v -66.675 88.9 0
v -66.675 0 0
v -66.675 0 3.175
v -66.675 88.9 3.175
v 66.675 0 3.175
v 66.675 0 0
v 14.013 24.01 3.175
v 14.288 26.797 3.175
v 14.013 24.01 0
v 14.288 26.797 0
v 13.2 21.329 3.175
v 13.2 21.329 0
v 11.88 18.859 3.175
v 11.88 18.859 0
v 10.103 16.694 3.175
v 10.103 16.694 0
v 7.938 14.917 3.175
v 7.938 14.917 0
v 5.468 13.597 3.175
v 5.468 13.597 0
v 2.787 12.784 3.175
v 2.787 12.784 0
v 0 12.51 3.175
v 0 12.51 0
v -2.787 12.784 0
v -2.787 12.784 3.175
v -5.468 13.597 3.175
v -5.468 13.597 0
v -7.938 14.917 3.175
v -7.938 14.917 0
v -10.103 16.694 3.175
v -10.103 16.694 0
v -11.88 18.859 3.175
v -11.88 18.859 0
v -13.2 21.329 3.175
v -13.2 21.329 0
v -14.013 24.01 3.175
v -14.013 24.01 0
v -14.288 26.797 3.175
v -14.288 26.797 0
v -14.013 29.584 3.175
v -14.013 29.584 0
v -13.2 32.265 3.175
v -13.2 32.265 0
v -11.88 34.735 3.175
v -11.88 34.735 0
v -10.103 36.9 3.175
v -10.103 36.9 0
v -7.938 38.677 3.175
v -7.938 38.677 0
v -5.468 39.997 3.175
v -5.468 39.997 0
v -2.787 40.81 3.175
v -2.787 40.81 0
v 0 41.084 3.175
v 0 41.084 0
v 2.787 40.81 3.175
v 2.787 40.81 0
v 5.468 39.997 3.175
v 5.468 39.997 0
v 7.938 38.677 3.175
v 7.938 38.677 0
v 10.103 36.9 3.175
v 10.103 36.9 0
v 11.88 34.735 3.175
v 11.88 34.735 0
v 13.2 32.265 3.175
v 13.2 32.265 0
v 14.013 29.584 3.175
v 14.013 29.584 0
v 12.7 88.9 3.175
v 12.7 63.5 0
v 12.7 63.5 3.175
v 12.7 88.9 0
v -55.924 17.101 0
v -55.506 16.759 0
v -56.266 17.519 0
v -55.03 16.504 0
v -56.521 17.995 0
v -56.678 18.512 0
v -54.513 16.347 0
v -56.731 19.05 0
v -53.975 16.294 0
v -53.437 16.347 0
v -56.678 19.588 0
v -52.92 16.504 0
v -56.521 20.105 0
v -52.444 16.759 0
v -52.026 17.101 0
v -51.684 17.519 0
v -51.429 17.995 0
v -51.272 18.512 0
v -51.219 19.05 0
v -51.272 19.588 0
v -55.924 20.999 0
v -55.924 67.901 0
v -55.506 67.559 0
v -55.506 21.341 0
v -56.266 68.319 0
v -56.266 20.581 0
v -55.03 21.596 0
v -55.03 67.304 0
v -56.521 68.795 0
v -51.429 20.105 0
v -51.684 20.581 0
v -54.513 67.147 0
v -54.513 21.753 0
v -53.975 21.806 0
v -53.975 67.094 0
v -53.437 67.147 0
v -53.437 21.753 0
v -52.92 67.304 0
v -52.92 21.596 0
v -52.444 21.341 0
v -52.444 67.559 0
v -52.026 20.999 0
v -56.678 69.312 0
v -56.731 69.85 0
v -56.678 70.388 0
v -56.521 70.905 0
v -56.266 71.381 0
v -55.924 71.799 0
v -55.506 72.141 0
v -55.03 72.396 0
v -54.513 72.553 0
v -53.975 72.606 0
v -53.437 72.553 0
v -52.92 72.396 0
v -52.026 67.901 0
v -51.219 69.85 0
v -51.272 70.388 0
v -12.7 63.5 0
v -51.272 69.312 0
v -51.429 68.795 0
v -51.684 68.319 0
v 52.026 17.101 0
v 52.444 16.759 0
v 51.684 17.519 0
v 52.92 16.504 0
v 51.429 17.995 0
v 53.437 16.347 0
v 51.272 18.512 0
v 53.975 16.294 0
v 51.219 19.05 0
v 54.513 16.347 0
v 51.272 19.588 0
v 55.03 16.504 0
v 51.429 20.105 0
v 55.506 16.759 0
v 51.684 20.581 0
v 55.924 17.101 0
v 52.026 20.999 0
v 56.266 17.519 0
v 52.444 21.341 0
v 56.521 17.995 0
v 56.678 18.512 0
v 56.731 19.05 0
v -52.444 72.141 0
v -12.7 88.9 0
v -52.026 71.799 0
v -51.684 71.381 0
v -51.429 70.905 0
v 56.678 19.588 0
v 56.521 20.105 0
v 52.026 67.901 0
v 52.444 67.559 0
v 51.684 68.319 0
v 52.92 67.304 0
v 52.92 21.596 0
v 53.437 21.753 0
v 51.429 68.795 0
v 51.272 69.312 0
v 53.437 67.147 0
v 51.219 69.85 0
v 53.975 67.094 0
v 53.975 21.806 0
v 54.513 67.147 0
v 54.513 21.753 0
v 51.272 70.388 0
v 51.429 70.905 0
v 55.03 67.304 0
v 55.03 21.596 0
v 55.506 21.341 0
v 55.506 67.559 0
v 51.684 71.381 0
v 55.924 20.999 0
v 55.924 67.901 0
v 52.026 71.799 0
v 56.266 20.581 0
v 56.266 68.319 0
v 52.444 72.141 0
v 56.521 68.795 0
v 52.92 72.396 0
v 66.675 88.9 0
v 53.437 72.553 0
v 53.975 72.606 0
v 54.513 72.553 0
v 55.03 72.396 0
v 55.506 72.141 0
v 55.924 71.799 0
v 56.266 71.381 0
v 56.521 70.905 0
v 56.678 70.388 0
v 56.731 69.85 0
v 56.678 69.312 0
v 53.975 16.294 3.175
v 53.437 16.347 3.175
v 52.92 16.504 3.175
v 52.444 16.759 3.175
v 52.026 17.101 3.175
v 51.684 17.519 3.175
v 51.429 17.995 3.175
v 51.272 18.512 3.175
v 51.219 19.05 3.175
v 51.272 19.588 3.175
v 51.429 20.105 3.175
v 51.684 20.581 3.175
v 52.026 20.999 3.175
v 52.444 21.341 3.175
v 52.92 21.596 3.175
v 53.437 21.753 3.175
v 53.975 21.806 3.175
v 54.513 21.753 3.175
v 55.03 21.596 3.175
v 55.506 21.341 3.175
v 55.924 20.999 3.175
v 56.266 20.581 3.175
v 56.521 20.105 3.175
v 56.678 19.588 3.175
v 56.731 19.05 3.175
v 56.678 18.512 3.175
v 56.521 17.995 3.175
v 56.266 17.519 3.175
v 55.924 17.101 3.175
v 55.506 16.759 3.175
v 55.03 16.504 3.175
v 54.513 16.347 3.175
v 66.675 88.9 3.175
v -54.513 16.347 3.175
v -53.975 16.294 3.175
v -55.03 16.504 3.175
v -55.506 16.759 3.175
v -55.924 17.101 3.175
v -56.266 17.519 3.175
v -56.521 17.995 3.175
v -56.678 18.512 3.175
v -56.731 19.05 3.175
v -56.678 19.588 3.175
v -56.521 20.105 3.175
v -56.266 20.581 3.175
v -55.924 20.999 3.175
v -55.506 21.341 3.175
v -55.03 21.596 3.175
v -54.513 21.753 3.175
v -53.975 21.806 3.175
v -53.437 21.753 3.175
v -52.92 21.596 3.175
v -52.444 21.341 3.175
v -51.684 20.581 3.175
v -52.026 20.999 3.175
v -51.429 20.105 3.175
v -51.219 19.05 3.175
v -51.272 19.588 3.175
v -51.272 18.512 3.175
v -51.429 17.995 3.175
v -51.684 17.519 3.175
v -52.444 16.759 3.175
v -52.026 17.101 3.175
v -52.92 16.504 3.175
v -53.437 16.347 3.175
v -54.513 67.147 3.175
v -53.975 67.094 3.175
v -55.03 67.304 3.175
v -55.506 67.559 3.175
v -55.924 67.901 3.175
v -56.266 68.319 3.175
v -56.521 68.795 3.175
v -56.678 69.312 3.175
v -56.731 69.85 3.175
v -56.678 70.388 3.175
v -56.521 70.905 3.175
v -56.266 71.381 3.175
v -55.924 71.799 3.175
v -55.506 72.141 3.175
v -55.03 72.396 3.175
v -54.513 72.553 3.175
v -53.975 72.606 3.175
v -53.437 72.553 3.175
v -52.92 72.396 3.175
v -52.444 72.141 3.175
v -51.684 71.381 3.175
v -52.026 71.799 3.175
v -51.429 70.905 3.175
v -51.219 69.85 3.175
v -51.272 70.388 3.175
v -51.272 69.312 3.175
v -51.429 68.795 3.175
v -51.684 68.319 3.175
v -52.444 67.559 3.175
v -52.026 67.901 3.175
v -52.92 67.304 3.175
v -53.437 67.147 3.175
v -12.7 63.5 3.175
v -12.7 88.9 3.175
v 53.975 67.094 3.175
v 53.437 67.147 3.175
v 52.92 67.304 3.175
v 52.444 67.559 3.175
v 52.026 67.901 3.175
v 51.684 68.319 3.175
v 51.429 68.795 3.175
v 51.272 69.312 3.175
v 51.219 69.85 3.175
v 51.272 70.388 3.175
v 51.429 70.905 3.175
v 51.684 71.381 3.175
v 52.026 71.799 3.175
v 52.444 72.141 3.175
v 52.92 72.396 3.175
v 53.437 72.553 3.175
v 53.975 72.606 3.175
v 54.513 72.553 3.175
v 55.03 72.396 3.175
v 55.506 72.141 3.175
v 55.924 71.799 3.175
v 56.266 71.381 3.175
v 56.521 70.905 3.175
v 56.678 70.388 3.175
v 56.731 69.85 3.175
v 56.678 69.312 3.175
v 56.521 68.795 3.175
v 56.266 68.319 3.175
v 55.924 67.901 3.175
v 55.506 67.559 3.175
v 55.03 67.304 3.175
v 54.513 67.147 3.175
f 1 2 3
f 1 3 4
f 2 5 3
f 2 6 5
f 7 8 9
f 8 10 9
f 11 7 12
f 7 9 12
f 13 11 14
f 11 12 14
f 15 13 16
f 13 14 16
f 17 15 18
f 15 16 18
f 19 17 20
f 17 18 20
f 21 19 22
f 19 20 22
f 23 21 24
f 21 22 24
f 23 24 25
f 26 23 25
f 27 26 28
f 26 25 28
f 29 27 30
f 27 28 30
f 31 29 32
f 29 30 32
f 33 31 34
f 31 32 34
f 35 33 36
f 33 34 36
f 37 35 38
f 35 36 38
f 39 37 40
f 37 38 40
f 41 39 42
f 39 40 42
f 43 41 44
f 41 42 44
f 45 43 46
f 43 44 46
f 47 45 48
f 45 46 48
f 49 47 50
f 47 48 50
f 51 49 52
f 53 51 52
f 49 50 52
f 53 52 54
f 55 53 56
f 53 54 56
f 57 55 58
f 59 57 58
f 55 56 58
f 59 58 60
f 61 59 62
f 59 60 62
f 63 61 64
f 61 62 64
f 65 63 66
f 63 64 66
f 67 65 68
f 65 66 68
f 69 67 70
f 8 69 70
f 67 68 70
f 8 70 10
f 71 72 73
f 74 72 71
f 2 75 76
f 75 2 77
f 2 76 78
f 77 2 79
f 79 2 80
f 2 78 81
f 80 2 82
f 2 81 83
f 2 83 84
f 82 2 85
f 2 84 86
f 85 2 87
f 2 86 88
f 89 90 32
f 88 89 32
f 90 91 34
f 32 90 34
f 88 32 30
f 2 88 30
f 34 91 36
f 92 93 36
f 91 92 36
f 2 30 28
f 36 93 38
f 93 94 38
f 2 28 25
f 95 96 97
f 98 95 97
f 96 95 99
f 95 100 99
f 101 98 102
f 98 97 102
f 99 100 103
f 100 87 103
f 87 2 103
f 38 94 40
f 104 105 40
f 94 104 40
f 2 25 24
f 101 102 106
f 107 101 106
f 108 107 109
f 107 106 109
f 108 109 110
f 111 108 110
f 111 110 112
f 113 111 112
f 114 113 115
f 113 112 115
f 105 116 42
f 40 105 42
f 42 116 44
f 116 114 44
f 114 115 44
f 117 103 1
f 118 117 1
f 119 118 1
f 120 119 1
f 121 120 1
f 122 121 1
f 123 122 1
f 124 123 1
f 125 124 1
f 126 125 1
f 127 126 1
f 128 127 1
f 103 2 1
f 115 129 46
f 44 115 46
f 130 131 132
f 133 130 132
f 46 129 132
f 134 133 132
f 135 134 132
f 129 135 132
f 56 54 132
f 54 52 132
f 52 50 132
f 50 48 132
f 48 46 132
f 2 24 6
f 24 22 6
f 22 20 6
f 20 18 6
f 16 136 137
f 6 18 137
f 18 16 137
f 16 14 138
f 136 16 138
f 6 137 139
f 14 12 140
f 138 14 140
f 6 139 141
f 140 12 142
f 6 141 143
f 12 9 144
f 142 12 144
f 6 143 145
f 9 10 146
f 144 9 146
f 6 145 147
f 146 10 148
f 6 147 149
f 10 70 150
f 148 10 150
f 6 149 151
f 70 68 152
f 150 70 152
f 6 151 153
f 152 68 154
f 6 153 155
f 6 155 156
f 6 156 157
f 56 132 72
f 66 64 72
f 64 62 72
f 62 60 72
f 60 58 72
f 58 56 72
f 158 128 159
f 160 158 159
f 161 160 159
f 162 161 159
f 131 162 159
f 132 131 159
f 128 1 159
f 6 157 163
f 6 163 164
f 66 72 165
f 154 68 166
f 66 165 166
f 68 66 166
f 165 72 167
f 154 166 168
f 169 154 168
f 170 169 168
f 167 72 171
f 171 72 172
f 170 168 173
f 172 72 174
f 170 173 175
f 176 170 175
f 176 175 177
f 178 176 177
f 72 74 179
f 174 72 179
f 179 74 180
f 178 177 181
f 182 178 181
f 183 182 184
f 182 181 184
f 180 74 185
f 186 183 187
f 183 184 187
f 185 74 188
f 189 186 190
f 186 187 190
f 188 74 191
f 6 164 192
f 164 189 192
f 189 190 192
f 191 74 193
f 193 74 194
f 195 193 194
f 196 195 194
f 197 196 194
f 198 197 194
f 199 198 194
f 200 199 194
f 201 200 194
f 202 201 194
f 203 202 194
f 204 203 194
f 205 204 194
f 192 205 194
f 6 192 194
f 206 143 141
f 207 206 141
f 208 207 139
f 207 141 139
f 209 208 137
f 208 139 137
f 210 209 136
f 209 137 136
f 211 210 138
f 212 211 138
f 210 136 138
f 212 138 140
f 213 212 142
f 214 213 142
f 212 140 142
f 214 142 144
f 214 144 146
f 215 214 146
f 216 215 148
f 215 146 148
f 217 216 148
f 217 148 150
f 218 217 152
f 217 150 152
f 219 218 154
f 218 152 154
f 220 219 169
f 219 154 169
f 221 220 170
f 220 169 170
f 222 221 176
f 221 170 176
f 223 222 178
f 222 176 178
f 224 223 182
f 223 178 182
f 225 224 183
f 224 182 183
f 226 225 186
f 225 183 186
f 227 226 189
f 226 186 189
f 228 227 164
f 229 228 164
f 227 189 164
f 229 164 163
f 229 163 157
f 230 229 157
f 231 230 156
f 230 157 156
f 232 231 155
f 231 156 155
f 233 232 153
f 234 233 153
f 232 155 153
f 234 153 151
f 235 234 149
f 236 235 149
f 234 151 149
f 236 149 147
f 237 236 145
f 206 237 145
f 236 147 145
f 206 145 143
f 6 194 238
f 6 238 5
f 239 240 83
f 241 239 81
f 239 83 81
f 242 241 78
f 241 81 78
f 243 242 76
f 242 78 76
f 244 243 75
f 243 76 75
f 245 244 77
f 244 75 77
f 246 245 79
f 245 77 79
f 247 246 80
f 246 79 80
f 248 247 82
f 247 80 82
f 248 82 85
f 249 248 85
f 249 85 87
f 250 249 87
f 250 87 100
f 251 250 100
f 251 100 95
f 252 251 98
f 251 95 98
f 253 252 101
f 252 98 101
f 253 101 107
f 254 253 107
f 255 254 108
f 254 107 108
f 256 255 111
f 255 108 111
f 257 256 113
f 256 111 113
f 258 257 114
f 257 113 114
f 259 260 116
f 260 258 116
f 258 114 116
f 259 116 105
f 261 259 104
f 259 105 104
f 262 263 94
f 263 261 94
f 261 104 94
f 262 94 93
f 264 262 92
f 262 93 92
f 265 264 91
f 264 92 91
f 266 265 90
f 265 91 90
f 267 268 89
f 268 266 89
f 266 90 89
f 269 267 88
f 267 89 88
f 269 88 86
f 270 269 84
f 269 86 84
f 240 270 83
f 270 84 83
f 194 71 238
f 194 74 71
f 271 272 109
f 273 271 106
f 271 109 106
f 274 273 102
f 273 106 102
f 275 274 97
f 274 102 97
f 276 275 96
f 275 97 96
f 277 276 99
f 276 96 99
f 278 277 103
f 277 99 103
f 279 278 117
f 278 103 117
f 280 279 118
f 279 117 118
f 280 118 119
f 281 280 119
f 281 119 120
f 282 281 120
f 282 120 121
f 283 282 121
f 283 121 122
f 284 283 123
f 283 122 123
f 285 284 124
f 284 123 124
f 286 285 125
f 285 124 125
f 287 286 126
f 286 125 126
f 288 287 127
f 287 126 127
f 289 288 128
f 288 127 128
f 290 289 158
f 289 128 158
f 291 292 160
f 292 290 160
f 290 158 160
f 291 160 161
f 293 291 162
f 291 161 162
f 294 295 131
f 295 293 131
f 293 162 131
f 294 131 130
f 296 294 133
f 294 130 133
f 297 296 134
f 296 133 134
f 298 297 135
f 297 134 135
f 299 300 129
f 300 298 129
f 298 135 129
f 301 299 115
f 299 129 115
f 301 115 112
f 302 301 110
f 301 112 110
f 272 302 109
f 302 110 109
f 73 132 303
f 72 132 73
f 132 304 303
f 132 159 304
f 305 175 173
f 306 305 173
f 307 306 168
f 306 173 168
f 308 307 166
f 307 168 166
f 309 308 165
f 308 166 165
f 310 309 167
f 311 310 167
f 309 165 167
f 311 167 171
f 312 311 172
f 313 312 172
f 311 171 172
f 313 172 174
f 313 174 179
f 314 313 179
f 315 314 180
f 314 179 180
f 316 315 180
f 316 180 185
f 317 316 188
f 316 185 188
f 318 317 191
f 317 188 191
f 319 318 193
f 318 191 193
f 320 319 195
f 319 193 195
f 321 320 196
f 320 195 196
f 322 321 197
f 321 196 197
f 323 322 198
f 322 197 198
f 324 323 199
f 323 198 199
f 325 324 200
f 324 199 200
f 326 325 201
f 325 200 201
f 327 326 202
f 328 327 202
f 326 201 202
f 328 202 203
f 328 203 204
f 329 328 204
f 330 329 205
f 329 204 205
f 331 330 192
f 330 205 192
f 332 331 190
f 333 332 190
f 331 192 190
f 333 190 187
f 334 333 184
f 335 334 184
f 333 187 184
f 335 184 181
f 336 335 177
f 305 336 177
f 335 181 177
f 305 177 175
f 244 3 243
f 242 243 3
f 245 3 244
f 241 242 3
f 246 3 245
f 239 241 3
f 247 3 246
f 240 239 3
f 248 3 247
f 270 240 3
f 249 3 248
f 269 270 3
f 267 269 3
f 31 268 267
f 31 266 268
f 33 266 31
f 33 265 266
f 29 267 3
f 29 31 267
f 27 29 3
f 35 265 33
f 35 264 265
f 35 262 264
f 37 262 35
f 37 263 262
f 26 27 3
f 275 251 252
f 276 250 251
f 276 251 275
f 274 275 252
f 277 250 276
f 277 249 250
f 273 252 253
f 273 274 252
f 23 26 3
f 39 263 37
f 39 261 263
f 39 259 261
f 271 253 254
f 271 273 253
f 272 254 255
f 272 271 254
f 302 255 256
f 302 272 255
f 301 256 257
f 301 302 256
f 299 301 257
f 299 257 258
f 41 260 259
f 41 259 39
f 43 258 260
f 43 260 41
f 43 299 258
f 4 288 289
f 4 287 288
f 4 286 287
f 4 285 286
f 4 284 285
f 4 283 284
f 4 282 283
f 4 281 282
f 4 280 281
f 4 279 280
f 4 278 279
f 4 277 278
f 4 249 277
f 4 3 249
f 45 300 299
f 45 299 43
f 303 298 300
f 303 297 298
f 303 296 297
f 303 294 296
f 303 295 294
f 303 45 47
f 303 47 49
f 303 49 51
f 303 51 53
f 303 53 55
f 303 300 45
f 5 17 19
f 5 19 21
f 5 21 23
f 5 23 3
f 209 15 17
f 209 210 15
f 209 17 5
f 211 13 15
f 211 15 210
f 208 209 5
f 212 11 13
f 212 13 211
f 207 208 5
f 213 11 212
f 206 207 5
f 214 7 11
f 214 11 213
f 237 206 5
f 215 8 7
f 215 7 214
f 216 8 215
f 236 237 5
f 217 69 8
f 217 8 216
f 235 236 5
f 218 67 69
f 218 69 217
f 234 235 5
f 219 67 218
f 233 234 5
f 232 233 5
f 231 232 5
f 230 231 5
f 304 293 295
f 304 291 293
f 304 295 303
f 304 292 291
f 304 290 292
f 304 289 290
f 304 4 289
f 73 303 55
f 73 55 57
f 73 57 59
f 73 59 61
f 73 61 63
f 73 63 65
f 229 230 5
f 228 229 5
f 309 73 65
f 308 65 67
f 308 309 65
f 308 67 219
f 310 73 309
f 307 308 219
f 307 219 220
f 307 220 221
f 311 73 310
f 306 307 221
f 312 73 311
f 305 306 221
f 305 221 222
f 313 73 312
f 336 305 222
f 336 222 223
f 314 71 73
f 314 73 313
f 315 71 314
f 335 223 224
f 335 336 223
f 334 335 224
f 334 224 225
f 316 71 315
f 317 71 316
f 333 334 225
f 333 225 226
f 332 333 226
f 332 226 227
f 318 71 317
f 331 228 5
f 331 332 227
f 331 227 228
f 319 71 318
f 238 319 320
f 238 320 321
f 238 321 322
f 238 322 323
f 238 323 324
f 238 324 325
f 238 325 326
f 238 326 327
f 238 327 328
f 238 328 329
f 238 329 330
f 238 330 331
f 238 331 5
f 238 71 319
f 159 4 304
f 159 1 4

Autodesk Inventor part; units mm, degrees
ref_plane "YZ Plane" through (0, 0, 0) normal (1, 0, 0) x (0, 1, 0)
ref_plane "XZ Plane" through (0, 0, 0) normal (0, 1, 0) x (-1, 0, 0)
ref_plane "XY Plane" through (0, 0, 0) normal (0, 0, 1) x (1, 0, 0)
sketch "Sketch1" plane through (0, 0, 0) normal (0, 0, 1) x (1, 0, 0)
  line L0 (0, -17.78) -> (0, 106.68) projected
  line L1 (66.675, 88.9) -> (66.675, 0)
  line L2 (66.675, 0) -> (-66.675, 0)
  line L3 (-66.675, 0) -> (-66.675, 88.9)
  line L4 (-93.345, 0) -> (93.345, 0) projected
  line L5 (-12.7, 88.9) -> (-12.7, 63.5)
  line L6 (-12.7, 63.5) -> (12.7, 63.5)
  line L7 (12.7, 63.5) -> (12.7, 88.9)
  line L8 (-66.675, 88.9) -> (-12.7, 88.9)
  line L9 (12.7, 88.9) -> (66.675, 88.9)
  line L10 (0, 0) -> (0, 26.797)
  circle A0 centre (0, 26.797) radius 14.2875
  dimension "d0" = 133.35
  dimension "d1" = 88.9
  dimension "d2" = 25.4
  dimension "d3" = 25.4
  dimension "d5" = 28.575
  dimension "d19" = 62.103
extrude "Extrusion1" add sketch "Sketch1" along normal blind 3.175 contours L2 L3 L8 L5 L6 L0 A0 | L0 A0 L6 L7 L9 L1 L2
sketch "Sketch2" plane through (0, 0, 3.175) normal (0, 0, 1) x (1, 0, 0)
  line L0 (66.675, 0) -> (66.675, 88.9) projected
  line L1 (-66.675, 0) -> (66.675, 0) projected
  line L2 (66.675, 88.9) -> (12.7, 88.9) projected
  point P0 (0, 0)
  point P1 (53.975, 69.85)
  point P2 (53.975, 19.05)
  dimension "d16" = 12.7
  dimension "d18" = 19.05
  dimension "d20" = 19.05
hole "Hole1" at (53.975, 69.85, 3.175) at (53.975, 19.05, 3.175) direction (0, 0, -1) diameter 5.5118 end through all clearance for "Flat Head Machine Screw" size "M5" standard "Ansi Metric M Profile"
mirror "Mirror1" about plane through (0, 0, 0) normal (1, 0, 0) of "Hole1"
equation "\"d20\" = d18"
properties part number "DIFF_PLATE_ROD_SHORT"
